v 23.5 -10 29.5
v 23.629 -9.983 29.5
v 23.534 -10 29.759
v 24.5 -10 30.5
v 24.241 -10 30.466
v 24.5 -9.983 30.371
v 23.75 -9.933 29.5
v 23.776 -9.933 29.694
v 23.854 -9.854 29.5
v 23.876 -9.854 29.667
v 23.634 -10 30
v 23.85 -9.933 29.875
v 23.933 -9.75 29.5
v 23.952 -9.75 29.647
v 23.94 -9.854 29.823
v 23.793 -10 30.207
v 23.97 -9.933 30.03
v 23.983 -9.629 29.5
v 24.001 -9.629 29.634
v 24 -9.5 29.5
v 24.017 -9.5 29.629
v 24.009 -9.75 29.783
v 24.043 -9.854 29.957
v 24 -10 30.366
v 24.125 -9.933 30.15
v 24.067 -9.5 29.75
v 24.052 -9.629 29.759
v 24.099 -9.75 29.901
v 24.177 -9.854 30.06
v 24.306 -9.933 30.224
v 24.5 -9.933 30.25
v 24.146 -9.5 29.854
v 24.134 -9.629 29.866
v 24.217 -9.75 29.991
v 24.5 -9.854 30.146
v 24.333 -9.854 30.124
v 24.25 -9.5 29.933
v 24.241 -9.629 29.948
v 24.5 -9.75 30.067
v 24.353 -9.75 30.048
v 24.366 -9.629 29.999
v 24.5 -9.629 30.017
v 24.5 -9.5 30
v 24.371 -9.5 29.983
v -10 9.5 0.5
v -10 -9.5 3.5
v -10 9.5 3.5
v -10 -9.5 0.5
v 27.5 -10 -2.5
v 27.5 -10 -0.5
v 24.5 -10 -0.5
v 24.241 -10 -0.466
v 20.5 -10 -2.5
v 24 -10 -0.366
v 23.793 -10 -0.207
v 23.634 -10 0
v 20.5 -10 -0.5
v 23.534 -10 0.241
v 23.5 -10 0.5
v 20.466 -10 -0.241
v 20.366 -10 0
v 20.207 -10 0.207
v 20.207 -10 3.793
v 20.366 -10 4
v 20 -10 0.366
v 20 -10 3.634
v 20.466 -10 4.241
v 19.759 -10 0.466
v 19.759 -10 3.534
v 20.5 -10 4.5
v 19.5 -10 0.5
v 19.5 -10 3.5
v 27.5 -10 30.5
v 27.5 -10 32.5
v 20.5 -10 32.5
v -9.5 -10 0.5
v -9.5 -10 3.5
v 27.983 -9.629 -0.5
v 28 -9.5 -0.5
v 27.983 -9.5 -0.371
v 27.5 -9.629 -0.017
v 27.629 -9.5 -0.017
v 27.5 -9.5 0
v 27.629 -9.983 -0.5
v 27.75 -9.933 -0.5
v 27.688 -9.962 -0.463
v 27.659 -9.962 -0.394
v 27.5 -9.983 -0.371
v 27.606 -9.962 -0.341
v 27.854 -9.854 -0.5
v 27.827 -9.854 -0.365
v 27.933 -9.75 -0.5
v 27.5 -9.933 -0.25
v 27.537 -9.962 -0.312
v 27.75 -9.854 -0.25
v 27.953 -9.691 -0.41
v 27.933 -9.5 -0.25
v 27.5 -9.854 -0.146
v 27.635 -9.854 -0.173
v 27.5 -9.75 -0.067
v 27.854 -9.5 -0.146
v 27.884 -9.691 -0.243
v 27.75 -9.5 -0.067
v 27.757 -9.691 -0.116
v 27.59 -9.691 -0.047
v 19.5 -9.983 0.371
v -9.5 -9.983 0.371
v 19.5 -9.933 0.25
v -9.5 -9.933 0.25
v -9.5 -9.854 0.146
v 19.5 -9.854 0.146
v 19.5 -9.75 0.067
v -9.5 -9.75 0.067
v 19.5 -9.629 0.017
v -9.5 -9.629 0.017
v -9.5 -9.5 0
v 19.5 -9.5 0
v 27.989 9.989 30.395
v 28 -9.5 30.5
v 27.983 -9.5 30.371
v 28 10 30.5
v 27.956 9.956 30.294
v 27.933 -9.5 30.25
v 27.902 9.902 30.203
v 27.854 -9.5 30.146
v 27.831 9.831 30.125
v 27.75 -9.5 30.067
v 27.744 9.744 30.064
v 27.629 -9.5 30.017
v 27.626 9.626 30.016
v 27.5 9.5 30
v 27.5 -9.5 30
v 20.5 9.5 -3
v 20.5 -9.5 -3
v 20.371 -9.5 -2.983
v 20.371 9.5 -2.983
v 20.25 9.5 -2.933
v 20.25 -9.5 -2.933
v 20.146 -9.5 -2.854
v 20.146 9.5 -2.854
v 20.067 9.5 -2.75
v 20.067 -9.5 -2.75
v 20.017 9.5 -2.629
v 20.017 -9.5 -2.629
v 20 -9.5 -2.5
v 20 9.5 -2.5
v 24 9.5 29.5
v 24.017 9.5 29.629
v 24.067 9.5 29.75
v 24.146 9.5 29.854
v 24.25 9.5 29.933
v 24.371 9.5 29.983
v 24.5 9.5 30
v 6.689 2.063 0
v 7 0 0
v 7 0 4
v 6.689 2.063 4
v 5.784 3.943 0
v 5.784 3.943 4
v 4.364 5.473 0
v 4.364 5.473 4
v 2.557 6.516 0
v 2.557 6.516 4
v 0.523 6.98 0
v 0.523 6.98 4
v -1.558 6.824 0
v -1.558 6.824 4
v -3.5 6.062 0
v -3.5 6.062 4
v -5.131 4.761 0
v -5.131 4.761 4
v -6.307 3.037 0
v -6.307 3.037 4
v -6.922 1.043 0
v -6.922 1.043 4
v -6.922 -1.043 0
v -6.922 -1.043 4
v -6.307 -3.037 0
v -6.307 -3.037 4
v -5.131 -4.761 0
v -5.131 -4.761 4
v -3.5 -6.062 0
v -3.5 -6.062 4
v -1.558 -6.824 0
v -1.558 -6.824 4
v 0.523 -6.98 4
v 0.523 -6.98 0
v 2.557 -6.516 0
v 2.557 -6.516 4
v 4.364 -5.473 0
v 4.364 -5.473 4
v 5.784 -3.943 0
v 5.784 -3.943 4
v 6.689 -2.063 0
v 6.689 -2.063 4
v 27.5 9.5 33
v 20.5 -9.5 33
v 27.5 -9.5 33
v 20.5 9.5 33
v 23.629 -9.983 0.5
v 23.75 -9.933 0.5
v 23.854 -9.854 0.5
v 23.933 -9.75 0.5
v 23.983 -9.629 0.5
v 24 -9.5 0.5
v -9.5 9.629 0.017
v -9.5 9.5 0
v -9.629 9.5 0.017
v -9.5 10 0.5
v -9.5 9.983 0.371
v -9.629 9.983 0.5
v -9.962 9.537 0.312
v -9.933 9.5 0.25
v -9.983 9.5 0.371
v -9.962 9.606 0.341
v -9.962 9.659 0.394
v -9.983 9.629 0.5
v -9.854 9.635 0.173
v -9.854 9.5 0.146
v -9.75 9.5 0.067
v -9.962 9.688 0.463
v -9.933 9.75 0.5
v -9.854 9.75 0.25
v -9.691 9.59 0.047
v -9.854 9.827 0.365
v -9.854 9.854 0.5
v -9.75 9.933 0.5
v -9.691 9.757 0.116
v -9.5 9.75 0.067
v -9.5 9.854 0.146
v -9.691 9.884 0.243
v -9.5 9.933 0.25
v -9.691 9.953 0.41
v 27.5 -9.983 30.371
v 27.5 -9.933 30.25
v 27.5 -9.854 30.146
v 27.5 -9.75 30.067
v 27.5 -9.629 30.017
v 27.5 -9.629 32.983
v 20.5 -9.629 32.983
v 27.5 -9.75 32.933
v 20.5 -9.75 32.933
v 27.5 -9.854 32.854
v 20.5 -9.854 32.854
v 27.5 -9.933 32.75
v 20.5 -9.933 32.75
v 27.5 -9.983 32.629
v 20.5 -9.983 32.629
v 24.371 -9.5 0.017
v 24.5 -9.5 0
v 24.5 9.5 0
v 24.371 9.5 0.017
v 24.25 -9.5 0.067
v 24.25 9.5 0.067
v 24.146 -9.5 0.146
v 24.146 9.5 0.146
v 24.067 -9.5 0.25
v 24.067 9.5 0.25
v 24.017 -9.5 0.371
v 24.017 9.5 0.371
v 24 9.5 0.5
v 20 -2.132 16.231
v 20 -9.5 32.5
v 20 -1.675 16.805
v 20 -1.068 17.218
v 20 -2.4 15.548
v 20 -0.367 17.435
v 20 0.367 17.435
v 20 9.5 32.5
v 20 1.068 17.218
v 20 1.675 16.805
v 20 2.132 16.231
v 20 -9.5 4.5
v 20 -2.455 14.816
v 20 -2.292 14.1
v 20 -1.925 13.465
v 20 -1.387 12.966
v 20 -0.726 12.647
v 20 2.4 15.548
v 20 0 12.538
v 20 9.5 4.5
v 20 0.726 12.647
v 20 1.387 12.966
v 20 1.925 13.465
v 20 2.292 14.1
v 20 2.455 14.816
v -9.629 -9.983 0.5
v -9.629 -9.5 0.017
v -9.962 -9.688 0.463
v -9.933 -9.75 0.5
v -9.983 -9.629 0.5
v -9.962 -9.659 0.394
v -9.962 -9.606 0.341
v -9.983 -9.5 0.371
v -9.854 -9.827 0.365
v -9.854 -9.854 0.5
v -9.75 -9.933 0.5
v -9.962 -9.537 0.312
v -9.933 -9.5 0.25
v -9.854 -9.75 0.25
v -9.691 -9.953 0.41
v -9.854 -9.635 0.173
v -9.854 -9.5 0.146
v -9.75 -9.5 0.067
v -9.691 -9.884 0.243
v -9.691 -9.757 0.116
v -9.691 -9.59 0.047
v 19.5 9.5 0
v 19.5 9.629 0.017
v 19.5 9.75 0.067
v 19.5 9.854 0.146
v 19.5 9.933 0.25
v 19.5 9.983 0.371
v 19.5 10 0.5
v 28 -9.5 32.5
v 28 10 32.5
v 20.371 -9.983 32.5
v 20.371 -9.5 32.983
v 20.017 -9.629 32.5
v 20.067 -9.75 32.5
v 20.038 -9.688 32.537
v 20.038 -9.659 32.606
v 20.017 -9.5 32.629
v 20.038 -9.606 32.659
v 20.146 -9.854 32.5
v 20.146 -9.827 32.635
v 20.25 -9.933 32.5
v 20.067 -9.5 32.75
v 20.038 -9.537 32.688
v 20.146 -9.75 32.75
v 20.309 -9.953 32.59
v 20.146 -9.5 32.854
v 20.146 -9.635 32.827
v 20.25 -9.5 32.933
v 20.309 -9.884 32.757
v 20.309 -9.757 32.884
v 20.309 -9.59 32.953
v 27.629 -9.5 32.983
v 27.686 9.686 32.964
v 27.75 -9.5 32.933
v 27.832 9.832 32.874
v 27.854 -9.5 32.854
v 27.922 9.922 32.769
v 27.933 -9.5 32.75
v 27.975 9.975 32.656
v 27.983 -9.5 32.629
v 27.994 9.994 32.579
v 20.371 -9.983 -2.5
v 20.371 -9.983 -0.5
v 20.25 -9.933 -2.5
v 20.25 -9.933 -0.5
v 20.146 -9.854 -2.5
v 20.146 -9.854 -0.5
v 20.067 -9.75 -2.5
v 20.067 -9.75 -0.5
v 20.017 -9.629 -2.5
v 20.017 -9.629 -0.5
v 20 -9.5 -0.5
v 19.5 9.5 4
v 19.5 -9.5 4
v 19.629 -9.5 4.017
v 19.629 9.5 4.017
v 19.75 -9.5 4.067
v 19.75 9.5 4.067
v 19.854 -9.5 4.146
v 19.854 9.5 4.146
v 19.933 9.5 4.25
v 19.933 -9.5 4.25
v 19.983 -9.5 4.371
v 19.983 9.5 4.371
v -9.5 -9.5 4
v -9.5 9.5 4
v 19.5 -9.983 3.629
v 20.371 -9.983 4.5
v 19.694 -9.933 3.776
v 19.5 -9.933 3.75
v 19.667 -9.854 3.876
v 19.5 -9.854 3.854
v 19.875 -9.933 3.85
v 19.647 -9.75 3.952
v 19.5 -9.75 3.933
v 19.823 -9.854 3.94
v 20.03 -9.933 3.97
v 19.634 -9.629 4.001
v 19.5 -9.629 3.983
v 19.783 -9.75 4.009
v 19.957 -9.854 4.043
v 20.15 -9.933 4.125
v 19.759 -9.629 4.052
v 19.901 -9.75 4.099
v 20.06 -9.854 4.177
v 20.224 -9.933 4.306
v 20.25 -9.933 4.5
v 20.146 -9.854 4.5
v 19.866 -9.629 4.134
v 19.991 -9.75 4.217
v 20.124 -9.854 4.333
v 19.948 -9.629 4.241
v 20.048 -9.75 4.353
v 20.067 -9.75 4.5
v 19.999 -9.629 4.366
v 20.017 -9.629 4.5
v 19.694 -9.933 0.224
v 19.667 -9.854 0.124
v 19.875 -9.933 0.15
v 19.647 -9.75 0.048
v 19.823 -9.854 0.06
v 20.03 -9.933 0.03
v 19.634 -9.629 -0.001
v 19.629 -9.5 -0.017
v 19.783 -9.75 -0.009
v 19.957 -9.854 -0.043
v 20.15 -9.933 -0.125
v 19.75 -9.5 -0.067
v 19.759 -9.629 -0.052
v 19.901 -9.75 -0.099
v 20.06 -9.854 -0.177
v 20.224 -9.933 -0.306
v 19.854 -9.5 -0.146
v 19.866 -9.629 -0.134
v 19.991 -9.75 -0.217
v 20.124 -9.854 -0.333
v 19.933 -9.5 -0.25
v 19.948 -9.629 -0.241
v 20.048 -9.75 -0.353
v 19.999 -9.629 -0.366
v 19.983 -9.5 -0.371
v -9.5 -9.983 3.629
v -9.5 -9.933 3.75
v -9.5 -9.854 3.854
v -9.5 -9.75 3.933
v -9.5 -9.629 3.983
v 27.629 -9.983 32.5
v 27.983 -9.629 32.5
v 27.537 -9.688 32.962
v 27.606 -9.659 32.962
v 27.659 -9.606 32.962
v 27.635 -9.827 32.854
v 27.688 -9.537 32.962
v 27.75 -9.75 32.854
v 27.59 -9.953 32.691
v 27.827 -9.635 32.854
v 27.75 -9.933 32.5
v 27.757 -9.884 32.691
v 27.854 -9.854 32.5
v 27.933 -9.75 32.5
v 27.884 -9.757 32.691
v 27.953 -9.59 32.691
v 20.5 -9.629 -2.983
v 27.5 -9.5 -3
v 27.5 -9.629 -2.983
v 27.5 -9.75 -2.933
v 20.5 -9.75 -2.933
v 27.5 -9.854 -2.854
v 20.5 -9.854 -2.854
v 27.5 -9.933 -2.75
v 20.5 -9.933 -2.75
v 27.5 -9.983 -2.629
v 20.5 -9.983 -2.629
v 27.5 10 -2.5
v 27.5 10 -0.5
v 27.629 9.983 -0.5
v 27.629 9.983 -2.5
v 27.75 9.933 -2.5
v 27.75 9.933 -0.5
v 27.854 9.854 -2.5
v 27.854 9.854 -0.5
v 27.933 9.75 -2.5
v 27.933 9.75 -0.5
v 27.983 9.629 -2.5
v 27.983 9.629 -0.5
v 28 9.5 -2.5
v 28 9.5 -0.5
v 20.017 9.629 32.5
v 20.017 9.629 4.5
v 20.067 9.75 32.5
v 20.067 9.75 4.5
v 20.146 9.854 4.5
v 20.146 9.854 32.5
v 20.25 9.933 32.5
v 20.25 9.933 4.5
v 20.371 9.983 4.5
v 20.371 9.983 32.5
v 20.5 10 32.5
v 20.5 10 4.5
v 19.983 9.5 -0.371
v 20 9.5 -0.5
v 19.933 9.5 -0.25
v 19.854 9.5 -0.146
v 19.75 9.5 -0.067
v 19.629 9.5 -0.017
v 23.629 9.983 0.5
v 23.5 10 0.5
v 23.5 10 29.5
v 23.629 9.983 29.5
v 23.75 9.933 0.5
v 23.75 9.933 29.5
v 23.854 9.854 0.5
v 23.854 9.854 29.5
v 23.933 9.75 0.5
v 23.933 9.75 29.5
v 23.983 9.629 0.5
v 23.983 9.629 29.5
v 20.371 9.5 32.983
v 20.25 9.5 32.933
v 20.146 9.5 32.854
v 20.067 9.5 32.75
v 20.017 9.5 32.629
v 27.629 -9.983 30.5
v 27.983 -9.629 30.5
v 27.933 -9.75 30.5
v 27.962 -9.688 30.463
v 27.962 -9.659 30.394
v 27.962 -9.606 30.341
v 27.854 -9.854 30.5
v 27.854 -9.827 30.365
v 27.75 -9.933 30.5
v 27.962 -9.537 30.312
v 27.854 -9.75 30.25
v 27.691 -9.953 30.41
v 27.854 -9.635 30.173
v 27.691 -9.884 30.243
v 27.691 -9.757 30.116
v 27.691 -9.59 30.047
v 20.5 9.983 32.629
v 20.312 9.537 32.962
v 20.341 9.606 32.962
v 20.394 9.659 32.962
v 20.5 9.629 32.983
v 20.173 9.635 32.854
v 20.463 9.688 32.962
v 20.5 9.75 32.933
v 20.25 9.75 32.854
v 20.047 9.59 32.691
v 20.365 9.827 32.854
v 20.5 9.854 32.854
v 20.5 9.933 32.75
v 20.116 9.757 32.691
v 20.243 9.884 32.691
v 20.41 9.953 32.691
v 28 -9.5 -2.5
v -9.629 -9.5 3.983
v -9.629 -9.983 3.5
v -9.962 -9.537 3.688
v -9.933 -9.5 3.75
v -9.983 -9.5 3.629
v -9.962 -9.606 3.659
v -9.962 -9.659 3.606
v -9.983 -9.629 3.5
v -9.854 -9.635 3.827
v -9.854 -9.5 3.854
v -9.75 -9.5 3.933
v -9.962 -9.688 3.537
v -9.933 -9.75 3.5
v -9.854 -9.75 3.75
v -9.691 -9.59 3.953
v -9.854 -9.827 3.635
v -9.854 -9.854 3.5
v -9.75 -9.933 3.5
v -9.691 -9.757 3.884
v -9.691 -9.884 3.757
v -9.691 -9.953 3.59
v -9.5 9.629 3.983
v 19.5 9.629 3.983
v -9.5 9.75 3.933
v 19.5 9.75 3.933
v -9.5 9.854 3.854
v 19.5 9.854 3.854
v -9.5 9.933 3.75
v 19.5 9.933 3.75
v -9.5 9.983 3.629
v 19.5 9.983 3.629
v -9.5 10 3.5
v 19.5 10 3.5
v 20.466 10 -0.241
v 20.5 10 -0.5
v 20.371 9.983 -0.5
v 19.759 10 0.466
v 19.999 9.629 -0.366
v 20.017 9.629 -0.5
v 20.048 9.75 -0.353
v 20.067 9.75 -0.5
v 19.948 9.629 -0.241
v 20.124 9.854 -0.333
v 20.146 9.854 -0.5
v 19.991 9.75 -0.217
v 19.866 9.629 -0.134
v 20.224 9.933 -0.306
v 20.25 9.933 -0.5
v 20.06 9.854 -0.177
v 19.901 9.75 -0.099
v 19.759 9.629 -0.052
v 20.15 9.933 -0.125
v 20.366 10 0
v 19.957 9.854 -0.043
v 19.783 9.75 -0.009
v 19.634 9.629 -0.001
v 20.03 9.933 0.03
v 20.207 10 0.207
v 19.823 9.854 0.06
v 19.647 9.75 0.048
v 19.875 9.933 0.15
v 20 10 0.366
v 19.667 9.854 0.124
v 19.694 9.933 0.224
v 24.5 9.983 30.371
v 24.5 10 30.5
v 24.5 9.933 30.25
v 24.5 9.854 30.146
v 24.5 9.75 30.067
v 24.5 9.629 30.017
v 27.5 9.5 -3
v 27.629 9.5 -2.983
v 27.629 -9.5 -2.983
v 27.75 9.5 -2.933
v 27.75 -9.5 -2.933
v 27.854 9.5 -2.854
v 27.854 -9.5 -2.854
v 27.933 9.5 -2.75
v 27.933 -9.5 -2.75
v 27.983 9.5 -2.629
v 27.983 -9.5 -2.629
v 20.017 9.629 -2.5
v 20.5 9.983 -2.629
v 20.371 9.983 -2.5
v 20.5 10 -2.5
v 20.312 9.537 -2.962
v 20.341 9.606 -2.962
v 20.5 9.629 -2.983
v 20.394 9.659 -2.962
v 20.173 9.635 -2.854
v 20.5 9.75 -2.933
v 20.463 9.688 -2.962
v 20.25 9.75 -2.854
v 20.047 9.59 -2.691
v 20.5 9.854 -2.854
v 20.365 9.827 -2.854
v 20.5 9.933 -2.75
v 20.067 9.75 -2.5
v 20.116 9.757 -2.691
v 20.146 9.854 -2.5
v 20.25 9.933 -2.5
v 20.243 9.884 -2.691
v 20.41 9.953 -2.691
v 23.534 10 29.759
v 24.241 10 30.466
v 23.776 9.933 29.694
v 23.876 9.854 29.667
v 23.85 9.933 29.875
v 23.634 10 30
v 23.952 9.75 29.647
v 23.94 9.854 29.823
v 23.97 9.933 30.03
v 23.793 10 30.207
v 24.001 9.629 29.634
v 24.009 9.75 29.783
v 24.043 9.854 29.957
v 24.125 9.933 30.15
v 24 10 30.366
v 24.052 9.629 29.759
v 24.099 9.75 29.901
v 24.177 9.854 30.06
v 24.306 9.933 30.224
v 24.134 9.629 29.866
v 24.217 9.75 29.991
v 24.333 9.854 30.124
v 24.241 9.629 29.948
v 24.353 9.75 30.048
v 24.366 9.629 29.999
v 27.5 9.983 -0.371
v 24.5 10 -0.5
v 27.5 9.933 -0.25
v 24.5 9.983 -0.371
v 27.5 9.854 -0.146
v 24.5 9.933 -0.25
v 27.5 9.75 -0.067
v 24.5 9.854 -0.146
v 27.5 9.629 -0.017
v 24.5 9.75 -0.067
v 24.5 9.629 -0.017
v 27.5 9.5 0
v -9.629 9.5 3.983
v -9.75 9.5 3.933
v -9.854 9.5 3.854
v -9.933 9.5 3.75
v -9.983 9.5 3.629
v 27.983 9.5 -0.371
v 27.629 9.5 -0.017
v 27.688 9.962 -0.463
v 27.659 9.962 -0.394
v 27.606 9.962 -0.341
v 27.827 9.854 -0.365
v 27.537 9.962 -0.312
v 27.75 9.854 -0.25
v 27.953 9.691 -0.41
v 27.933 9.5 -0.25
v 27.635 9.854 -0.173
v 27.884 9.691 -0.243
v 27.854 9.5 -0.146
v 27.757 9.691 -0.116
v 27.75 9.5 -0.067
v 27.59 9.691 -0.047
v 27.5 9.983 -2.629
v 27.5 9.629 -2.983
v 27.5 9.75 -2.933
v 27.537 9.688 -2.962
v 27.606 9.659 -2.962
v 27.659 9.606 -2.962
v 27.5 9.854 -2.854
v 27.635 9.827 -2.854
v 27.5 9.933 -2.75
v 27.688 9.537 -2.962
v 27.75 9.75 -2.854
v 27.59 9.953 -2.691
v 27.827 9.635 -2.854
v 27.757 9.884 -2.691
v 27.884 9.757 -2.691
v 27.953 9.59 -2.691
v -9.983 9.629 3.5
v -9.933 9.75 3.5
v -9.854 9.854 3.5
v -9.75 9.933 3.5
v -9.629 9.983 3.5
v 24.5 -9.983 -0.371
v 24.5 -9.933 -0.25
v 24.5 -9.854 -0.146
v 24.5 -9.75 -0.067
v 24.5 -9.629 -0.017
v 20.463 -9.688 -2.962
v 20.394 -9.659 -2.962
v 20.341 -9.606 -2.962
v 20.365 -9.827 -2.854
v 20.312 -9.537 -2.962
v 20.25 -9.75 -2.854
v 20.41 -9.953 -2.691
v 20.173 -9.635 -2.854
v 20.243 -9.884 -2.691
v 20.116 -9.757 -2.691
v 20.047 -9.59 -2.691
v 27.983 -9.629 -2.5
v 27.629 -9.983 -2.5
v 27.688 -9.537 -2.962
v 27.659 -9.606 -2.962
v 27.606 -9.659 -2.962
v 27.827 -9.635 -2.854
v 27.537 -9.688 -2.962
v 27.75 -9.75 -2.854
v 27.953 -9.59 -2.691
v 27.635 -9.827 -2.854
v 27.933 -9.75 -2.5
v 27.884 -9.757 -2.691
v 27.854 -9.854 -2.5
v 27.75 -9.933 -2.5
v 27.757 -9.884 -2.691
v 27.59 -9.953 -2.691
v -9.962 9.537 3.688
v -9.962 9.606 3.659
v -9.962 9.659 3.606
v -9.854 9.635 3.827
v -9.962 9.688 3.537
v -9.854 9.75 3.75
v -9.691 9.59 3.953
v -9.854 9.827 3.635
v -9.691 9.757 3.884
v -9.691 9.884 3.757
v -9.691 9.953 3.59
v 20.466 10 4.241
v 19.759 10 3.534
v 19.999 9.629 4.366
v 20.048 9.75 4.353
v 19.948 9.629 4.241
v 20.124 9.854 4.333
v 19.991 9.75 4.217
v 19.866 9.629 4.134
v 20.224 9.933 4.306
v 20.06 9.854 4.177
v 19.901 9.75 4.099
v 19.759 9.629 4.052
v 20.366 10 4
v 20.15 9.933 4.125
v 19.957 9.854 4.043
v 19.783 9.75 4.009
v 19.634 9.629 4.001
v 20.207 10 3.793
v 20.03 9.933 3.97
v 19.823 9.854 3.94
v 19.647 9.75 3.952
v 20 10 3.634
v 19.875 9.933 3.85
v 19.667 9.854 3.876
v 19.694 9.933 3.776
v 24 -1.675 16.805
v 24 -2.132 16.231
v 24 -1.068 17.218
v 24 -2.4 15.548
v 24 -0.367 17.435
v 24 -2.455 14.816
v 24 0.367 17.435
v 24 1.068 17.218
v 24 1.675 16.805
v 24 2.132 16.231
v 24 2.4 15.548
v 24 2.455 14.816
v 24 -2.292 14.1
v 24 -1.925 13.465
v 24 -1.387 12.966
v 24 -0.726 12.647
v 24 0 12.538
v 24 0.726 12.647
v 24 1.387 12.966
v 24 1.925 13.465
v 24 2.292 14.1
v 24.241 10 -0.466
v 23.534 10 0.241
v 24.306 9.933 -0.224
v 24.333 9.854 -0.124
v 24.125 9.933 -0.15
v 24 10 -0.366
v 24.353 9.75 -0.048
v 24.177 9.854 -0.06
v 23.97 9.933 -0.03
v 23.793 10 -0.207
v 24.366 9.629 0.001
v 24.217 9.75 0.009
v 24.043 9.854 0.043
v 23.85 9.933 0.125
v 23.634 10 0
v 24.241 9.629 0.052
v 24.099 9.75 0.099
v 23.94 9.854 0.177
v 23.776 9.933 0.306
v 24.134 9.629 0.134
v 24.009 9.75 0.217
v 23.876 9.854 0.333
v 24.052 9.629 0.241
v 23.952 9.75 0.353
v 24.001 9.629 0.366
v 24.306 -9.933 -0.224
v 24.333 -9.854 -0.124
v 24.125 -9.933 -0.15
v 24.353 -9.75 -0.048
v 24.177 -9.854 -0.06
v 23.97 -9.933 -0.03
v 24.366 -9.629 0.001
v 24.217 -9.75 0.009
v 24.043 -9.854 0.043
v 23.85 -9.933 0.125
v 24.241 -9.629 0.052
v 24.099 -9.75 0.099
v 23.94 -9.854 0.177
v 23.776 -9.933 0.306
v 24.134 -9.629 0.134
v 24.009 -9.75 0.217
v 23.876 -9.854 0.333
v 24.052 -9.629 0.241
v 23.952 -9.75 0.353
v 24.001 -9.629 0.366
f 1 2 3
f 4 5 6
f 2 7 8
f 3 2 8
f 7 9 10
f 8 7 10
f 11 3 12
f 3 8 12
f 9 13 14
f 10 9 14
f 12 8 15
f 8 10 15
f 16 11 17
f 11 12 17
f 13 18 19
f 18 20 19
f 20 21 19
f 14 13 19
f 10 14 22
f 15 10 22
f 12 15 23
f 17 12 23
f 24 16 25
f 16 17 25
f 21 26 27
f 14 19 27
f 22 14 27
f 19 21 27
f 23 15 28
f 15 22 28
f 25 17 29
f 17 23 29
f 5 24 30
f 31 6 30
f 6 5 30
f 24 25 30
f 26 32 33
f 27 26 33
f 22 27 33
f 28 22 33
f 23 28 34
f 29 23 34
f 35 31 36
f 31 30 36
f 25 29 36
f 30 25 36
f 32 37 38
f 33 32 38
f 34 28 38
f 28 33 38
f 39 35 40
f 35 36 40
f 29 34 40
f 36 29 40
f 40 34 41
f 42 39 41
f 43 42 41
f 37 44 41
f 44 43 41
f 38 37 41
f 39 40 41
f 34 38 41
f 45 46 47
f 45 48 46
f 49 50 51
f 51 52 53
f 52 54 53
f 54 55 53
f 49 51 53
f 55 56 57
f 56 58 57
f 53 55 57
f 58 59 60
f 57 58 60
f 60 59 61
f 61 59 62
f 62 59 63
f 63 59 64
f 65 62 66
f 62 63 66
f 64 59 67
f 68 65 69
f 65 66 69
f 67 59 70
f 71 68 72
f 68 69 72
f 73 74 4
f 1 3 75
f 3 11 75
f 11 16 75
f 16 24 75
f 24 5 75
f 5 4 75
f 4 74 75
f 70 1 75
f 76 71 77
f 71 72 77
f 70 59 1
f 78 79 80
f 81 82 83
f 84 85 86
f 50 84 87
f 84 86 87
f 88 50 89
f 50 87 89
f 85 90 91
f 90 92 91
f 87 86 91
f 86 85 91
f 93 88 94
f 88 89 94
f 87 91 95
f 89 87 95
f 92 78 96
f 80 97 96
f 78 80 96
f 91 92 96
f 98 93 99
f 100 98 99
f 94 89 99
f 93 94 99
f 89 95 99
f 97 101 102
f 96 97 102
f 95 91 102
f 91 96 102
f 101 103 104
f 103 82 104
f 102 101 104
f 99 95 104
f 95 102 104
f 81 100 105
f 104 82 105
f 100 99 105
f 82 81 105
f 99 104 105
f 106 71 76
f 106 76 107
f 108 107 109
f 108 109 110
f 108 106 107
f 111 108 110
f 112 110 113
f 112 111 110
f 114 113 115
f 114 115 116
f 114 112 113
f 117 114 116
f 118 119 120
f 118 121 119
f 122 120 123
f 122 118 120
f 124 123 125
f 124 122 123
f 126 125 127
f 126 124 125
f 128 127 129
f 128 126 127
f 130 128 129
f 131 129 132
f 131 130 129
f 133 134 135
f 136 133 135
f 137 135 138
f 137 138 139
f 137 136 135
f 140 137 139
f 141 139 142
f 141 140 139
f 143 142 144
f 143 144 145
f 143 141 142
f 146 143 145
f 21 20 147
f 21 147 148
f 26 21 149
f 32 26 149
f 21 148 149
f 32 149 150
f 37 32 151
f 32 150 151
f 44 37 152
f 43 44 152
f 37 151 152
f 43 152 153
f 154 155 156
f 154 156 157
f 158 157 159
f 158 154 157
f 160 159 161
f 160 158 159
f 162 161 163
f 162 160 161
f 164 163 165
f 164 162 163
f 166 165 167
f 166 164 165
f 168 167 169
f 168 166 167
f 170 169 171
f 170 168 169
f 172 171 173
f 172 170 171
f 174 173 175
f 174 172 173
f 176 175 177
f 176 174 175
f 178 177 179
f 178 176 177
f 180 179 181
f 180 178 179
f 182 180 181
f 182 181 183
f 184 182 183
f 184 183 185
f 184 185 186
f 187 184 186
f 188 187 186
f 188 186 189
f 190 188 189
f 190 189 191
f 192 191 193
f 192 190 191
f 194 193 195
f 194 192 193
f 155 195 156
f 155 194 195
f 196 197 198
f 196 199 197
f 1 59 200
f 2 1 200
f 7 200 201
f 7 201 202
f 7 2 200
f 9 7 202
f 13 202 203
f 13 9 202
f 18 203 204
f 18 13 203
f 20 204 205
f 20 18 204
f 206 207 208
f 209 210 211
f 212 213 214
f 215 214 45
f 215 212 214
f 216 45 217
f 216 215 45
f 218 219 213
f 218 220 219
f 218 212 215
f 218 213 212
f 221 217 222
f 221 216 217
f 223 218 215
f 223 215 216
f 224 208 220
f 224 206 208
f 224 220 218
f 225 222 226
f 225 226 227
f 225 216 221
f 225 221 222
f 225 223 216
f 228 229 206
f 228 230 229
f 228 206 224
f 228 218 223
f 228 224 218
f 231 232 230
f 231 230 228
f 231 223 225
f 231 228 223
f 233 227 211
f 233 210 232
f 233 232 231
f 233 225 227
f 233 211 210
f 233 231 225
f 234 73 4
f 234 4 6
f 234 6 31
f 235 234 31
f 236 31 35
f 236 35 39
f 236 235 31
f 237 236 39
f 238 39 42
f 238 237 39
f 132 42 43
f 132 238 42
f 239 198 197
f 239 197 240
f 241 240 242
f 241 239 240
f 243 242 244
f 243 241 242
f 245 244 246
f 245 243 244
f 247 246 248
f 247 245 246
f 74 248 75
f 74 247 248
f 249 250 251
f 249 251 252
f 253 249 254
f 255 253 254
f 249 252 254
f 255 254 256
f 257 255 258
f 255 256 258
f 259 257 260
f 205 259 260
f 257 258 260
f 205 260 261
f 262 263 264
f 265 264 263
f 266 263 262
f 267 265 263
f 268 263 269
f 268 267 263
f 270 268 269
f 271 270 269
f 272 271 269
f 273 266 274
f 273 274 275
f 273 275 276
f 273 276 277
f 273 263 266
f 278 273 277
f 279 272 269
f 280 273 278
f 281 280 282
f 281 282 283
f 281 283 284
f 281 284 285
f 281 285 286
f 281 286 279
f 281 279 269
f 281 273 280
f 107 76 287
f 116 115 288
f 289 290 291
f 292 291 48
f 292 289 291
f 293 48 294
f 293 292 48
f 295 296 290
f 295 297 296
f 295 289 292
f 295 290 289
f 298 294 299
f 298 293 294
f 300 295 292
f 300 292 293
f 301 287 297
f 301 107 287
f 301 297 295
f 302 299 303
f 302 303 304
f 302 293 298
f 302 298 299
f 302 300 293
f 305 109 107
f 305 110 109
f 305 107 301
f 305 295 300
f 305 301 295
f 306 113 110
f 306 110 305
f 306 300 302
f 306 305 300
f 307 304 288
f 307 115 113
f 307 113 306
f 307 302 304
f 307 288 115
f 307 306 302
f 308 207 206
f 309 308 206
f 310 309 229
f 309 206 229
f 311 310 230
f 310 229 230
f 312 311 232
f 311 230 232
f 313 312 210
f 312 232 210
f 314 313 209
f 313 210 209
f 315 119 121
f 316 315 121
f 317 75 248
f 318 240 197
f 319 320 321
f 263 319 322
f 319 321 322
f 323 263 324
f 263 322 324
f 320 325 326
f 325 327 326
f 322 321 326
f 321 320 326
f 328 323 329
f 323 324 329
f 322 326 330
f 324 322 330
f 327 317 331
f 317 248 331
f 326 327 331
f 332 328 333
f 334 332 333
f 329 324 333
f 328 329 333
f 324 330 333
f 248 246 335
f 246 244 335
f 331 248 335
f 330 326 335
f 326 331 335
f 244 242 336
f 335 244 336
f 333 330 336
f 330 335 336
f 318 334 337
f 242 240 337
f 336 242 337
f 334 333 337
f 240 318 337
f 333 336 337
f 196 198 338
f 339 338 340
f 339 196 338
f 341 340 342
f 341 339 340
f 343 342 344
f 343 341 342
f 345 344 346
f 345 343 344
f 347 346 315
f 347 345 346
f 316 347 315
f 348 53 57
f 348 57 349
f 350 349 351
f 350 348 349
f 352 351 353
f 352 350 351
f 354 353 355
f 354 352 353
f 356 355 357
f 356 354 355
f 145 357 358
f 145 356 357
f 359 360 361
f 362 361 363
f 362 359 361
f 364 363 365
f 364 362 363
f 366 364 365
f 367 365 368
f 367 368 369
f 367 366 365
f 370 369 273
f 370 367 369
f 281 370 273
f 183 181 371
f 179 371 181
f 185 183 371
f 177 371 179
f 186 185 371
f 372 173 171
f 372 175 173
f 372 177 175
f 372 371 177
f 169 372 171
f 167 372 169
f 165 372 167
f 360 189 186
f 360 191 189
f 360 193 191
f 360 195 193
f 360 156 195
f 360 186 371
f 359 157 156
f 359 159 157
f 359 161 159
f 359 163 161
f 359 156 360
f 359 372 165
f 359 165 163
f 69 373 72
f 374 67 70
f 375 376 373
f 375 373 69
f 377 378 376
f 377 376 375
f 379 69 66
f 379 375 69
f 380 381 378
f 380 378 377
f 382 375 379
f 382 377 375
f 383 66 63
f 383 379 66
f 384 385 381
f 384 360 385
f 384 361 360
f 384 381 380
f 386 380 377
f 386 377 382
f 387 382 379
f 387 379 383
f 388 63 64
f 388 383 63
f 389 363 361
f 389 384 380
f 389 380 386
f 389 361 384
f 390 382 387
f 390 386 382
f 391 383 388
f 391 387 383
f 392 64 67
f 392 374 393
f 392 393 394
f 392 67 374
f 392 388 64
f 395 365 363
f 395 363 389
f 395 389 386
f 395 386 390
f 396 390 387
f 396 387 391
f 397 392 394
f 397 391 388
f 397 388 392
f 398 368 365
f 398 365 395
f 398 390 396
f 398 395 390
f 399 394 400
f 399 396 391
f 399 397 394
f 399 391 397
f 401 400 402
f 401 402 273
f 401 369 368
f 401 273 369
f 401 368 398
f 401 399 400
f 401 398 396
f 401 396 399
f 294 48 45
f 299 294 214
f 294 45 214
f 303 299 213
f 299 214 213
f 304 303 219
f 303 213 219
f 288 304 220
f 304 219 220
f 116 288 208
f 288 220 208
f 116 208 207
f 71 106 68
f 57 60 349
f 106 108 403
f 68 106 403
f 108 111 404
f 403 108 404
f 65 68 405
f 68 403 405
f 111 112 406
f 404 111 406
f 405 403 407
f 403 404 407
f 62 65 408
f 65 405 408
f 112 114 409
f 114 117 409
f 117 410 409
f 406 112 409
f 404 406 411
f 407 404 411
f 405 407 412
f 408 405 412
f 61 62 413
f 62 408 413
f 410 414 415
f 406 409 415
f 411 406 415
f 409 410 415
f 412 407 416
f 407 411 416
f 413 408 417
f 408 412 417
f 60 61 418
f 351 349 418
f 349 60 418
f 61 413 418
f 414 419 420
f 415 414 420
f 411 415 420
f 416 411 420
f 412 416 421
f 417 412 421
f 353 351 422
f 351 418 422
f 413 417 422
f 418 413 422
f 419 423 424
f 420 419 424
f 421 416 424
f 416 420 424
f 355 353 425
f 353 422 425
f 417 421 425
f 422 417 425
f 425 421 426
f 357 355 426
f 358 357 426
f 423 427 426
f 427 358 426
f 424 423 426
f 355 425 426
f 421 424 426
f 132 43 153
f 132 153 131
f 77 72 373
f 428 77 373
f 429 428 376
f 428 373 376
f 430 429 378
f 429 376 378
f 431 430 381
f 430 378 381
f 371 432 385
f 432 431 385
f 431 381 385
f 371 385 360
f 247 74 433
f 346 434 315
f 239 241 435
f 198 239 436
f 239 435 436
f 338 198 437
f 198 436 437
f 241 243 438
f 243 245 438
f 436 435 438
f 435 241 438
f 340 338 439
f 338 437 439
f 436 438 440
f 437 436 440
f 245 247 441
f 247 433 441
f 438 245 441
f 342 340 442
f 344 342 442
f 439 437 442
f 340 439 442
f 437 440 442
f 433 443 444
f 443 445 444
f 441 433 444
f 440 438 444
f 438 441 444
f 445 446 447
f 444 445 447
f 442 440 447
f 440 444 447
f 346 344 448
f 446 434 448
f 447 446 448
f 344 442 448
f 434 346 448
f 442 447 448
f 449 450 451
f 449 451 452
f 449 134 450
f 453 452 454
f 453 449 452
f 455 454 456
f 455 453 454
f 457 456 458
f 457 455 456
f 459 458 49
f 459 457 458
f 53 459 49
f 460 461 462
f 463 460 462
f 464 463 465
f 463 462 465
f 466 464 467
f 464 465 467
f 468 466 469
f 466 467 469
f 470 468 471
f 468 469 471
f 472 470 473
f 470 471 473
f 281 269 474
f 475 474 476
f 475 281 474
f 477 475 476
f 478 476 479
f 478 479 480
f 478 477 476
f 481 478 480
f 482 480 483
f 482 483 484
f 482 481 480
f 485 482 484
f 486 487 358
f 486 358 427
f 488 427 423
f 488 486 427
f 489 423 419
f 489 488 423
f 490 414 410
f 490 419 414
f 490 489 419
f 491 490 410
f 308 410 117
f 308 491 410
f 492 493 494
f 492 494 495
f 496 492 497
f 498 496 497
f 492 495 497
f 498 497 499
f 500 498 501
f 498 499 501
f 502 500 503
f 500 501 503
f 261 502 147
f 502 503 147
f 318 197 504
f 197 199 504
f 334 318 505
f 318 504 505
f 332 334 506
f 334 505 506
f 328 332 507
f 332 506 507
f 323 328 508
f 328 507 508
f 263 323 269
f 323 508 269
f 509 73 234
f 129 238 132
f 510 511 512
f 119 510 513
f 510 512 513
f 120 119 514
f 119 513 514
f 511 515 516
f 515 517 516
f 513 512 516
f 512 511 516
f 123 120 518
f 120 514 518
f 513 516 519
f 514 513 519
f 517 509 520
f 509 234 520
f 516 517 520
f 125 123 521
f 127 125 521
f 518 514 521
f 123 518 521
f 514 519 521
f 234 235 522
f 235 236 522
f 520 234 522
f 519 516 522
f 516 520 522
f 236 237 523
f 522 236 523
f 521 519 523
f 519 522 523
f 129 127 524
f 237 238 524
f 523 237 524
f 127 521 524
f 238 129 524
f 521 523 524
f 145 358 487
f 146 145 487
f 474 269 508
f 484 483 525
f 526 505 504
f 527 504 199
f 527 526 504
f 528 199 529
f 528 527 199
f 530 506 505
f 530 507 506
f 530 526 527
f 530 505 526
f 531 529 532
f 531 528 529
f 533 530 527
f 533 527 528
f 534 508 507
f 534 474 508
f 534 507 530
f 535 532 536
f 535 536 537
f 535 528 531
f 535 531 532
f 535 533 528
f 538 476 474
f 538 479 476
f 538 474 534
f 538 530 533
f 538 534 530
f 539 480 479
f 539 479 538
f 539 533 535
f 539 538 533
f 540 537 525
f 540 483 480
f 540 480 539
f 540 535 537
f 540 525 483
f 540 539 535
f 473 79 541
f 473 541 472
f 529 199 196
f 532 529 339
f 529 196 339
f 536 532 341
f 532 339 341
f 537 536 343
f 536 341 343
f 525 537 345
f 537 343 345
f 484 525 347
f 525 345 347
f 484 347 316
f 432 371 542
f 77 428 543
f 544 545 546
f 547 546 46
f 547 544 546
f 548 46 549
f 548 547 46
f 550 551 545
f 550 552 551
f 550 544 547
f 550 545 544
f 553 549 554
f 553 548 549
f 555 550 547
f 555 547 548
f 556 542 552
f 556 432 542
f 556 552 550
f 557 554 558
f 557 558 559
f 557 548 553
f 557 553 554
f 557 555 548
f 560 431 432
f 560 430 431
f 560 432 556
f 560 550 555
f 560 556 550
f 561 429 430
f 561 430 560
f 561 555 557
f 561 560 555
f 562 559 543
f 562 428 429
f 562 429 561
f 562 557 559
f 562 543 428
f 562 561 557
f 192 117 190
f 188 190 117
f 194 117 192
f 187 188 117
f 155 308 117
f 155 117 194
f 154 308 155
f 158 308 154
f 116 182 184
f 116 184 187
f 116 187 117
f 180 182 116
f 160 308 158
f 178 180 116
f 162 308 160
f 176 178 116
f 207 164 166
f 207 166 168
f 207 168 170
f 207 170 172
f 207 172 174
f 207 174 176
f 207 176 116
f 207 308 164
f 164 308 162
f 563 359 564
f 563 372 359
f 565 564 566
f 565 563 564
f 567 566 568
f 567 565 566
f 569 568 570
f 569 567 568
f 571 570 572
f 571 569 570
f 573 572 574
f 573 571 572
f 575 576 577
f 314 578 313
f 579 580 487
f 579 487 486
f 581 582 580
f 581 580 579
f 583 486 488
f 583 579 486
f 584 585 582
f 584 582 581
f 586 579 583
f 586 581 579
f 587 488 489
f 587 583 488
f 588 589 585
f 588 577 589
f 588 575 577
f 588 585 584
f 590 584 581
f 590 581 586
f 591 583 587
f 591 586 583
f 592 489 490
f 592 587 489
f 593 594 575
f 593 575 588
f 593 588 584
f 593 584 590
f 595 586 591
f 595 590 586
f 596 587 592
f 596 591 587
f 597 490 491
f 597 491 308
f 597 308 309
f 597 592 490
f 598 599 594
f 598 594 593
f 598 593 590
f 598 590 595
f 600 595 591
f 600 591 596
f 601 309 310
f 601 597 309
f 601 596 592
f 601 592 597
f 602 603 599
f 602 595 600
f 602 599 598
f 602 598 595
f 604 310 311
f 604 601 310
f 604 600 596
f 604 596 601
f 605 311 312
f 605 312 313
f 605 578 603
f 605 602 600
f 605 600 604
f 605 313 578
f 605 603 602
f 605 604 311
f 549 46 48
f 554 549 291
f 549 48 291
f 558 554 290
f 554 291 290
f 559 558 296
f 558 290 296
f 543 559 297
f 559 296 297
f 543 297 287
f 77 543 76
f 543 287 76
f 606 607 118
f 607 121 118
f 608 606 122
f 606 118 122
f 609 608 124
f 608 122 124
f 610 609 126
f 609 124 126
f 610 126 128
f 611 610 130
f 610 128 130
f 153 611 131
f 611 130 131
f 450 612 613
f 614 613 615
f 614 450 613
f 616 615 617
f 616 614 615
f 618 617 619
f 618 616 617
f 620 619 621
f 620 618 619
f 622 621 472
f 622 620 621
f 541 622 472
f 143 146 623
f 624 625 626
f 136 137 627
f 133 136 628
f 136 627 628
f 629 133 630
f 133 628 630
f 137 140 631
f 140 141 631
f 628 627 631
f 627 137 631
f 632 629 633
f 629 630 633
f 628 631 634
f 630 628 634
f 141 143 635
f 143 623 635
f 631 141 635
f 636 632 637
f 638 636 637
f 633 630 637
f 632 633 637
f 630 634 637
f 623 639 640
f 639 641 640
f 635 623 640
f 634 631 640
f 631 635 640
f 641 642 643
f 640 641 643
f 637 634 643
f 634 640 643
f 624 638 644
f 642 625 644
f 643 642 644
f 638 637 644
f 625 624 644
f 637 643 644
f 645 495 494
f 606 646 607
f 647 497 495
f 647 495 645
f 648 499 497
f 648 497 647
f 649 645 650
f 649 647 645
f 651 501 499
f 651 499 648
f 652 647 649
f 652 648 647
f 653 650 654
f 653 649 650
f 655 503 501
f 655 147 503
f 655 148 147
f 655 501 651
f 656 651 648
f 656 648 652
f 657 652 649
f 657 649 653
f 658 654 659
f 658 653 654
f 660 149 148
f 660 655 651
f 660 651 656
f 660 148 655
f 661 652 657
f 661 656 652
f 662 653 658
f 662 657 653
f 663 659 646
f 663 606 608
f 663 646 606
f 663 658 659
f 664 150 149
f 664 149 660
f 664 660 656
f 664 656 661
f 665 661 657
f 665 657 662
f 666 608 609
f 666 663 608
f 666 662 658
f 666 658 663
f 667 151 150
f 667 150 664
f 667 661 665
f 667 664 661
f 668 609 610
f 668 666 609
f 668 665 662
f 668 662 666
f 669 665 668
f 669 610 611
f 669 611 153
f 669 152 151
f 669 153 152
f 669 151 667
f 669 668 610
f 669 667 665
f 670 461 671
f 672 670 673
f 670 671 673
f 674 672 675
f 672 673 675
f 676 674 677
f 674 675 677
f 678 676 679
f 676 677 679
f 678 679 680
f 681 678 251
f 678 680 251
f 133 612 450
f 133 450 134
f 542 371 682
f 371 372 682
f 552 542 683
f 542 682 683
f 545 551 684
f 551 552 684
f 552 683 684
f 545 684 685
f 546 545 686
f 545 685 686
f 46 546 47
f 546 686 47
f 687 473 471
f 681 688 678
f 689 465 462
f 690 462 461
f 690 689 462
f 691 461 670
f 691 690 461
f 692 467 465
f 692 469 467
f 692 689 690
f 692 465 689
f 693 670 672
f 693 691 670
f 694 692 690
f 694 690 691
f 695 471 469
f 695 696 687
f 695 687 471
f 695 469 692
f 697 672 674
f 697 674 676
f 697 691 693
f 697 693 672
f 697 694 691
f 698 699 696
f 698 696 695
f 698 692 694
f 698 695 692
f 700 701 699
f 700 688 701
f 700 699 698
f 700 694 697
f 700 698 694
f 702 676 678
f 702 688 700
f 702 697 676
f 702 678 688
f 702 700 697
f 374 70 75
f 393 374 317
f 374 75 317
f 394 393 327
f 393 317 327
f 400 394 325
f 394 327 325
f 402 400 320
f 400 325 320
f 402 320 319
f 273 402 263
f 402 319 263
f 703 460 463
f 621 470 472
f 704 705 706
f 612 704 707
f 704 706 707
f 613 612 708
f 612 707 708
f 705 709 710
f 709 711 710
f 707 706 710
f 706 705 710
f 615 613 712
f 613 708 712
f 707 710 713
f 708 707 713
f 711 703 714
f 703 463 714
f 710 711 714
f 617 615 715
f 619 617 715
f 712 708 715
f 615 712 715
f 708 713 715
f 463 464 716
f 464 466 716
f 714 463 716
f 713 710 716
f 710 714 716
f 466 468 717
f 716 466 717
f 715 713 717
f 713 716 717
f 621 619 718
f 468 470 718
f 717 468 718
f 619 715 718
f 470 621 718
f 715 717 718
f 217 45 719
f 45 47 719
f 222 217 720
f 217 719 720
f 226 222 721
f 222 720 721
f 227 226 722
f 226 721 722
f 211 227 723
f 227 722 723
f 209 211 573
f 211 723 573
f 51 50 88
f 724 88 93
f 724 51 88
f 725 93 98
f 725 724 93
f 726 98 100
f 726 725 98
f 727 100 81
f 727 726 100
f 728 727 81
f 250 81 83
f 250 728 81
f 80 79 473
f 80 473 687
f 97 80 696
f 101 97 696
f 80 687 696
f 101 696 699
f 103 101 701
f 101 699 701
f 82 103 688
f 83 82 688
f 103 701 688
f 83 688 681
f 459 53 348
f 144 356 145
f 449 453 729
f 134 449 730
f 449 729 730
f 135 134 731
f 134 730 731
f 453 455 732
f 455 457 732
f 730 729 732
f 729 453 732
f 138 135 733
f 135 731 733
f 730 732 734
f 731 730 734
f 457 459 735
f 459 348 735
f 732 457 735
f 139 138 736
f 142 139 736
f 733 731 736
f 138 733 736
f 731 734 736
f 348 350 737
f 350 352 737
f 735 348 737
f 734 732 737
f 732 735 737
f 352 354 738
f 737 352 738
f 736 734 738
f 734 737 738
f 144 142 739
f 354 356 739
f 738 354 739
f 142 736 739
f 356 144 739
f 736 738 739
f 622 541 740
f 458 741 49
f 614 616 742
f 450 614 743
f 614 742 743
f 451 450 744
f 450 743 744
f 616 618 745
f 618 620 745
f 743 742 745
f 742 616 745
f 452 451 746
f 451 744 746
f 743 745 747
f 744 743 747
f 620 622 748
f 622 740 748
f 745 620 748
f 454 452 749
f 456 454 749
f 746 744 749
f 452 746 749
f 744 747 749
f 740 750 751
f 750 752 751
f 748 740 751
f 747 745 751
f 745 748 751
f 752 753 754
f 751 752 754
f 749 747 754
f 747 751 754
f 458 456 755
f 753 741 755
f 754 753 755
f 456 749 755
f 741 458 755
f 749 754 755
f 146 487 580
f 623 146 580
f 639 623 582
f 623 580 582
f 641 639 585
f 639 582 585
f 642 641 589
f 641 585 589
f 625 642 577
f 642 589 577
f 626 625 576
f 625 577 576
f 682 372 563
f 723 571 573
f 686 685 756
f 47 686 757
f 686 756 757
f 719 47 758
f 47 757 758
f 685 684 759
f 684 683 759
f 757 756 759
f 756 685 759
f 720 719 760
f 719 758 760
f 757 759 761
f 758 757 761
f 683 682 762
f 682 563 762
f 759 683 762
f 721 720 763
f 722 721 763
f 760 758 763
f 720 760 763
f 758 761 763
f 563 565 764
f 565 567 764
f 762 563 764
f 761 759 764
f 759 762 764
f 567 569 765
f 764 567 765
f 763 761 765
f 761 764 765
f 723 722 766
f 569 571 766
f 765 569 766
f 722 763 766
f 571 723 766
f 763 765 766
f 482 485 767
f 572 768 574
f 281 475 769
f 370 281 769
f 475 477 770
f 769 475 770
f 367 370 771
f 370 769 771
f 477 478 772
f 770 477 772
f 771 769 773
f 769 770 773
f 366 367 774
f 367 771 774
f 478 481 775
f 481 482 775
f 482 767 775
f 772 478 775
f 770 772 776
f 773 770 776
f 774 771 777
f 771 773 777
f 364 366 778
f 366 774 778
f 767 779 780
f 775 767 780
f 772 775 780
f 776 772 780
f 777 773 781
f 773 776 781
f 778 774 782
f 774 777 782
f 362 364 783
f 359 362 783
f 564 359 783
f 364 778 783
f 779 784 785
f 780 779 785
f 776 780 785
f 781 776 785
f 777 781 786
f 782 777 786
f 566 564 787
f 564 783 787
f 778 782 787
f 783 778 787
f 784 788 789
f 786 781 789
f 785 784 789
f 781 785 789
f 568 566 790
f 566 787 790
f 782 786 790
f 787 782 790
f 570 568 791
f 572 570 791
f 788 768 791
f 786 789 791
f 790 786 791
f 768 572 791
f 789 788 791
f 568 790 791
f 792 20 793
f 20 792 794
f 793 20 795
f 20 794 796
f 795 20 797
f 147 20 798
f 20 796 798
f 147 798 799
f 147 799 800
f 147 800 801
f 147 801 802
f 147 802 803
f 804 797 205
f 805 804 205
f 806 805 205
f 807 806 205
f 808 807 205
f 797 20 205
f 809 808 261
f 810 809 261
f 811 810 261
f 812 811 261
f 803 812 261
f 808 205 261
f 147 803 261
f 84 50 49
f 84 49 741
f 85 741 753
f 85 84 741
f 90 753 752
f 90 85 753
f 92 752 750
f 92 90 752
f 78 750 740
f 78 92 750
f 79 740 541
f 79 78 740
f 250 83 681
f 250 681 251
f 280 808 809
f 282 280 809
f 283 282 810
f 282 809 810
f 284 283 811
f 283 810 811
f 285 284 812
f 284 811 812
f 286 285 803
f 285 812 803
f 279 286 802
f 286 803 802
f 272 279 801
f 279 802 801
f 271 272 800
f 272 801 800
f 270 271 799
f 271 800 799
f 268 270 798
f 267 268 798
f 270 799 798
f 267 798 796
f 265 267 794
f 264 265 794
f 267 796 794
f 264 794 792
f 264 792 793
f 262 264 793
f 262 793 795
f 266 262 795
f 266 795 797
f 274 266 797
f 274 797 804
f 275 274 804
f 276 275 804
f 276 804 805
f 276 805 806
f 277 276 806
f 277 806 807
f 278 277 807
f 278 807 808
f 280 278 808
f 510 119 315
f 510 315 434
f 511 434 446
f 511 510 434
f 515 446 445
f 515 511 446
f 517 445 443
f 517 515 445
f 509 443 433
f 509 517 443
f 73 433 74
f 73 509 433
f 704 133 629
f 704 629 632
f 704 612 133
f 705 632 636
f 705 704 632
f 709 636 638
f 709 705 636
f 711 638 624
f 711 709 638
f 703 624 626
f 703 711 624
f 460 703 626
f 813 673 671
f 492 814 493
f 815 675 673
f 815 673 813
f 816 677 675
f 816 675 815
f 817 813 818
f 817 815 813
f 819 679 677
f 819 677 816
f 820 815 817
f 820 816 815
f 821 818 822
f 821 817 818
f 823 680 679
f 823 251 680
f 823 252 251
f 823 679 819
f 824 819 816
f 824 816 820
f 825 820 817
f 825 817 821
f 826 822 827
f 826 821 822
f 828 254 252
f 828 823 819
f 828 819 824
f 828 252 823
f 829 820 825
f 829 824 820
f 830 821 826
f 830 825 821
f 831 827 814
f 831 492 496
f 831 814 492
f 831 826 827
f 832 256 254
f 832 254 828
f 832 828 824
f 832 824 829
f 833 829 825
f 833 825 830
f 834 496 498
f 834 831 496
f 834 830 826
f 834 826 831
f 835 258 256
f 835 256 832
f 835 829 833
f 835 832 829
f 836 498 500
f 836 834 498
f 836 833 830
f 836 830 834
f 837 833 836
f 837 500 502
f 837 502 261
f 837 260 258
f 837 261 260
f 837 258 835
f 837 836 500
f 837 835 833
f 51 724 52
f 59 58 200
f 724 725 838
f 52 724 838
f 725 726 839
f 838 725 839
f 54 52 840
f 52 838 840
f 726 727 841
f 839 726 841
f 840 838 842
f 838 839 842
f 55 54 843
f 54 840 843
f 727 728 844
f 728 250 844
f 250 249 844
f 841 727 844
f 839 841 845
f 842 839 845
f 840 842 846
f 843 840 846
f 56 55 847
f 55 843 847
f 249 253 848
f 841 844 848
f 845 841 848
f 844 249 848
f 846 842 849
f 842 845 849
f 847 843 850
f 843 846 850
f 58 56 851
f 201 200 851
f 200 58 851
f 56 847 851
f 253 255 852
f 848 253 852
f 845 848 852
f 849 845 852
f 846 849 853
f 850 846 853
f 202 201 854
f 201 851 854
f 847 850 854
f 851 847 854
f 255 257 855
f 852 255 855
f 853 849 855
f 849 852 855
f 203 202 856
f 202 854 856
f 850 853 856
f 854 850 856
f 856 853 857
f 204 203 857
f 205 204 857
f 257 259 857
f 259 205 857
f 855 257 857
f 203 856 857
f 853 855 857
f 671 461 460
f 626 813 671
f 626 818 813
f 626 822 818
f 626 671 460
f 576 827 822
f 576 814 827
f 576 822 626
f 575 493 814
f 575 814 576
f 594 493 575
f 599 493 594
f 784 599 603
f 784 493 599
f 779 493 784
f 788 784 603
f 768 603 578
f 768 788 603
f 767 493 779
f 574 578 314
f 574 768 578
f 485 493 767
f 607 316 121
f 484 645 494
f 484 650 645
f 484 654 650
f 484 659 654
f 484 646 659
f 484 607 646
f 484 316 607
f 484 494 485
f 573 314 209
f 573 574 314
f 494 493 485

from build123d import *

# Parameters (mm, degrees)
SCHIZZO1_W                   = 30
SCHIZZO1_H                   = 20
SCHIZZO1_R                   = 7
ESTRUSIONE_ESTRUSIONE1_DEPTH = 4
SCHIZZO2_W                   = 4
SCHIZZO2_H                   = 20
ESTRUSIONE_ESTRUSIONE2_DEPTH = 30
SCHIZZO3_W                   = 8
SCHIZZO3_H                   = 20
ESTRUSIONE_ESTRUSIONE3_DEPTH = 3
SCHIZZO4_W                   = 8
SCHIZZO4_H                   = 20
ESTRUSIONE_ESTRUSIONE4_DEPTH = 3
RACCORDO1_R                  = 0.5
RACCORDO2_R                  = 0.5
RACCORDO3_R                  = 0.5
RACCORDO4_R                  = 0.5
RACCORDO5_R                  = 0.5
SCHIZZO5_R                   = 2.462201362
TAGLIO_ESTRUSIONE1_DEPTH     = 5


with BuildPart() as part:
    # Schizzo1 → Estrusione-Estrusione1 (new body)
    with BuildSketch(Plane.XY):
        with Locations((5, 0)):
            Rectangle(SCHIZZO1_W, SCHIZZO1_H)
        Circle(SCHIZZO1_R, mode=Mode.SUBTRACT)
    extrude(amount=ESTRUSIONE_ESTRUSIONE1_DEPTH)

    # Schizzo2 → Estrusione-Estrusione2 (add)
    with BuildSketch(Plane(origin=(0, 0, 0), x_dir=(-1, 0, 0), z_dir=(0, 0, -1))):
        with Locations((-22, 0)):
            Rectangle(SCHIZZO2_W, SCHIZZO2_H)
    extrude(amount=-ESTRUSIONE_ESTRUSIONE2_DEPTH)

    # Schizzo3 → Estrusione-Estrusione3 (add)
    with BuildSketch(Plane.XY.offset(30)):
        with Locations((24, 0)):
            Rectangle(SCHIZZO3_W, SCHIZZO3_H)
    extrude(amount=ESTRUSIONE_ESTRUSIONE3_DEPTH)

    # Schizzo4 → Estrusione-Estrusione4 (add)
    with BuildSketch(Plane(origin=(0, 0, 0), x_dir=(-1, 0, 0), z_dir=(0, 0, -1))):
        with Locations((-24, 0)):
            Rectangle(SCHIZZO4_W, SCHIZZO4_H)
    extrude(amount=ESTRUSIONE_ESTRUSIONE4_DEPTH)

    # Raccordo1
    raccordo1_edges = [part.edges().sort_by_distance(p)[0] for p in [
        (20, 0, 4),
        (24, 0, 30),
        (24, 0, 0),
        (20, 0, 0),
    ]]
    fillet(raccordo1_edges, radius=RACCORDO1_R)

    # Raccordo2
    raccordo2_edges = [part.edges().sort_by_distance(p)[0] for p in [
        (4.75, -10, 0),
        (20, -10, -1.75),
        (4.75, 10, 0),
        (19.853553391, 10, -0.146446609),
        (19.853553391, -10, -0.146446609),
        (28, 0, 0),
        (20, 10, -1.75),
    ]]
    fillet(raccordo2_edges, radius=RACCORDO2_R)

    # Raccordo3
    raccordo3_edges = [part.edges().sort_by_distance(p)[0] for p in [
        (26.25, -10, 30),
        (24, -10, 15),
        (28, -10, -1.75),
        (27.853553391, -10, -0.146446609),
        (24.146446609, -10, 29.853553391),
        (24.146446609, -10, 0.146446609),
        (26, -10, 0),
    ]]
    fillet(raccordo3_edges, radius=RACCORDO3_R)

    # Raccordo4
    raccordo4_edges = [part.edges().sort_by_distance(p)[0] for p in [
        (28, 0.25, 30),
        (28, -9.853553391, 30.146446609),
        (28, -10, 31.75),
        (26.25, 10, 30),
        (24, 10, 15),
        (28, 10, -1.75),
        (27.853553391, 10, -0.146446609),
        (24.146446609, 10, 29.853553391),
        (24.146446609, 10, 0.146446609),
        (26, 10, 0),
    ]]
    fillet(raccordo4_edges, radius=RACCORDO4_R)

    # Raccordo5
    raccordo5_edges = [part.edges().sort_by_distance(p)[0] for p in [
        (20, 0, -3),
        (20.146446609, -9.853553391, -3),
        (20.146446609, 9.853553391, -3),
        (24, -10, -3),
        (27.853553391, -9.853553391, -3),
        (28, 0.25, 33),
        (28, 0, -3),
        (27.853553391, 9.853553391, -3),
        (27.853553391, -9.853553391, 33),
        (20, 10, 18.75),
        (20, -10, 18.75),
        (20, 0, 33),
        (23.75, -10, 33),
        (24, 10, 33),
        (-10, 0, 4),
        (4.75, 10, 4),
        (19.853553391, 10, 4.146446609),
        (19.853553391, -10, 4.146446609),
        (-10, 10, 2.25),
        (-10, -10, 2.25),
        (4.75, -10, 4),
        (24, 10, -3),
        (-10, 0, 0),
        (-10, -9.853553391, 0.146446609),
        (-10, 9.853553391, 0.146446609),
    ]]
    fillet(raccordo5_edges, radius=RACCORDO5_R)

    # Schizzo5 → Taglio-Estrusione1 (cut)
    with BuildSketch(Plane(origin=(24, 0, 0), x_dir=(0, 0, -1), z_dir=(1, 0, 0))):
        with Locations((-15, 0)):
            Circle(SCHIZZO5_R)
    extrude(amount=-TAGLIO_ESTRUSIONE1_DEPTH, mode=Mode.SUBTRACT)


solid = part.part
